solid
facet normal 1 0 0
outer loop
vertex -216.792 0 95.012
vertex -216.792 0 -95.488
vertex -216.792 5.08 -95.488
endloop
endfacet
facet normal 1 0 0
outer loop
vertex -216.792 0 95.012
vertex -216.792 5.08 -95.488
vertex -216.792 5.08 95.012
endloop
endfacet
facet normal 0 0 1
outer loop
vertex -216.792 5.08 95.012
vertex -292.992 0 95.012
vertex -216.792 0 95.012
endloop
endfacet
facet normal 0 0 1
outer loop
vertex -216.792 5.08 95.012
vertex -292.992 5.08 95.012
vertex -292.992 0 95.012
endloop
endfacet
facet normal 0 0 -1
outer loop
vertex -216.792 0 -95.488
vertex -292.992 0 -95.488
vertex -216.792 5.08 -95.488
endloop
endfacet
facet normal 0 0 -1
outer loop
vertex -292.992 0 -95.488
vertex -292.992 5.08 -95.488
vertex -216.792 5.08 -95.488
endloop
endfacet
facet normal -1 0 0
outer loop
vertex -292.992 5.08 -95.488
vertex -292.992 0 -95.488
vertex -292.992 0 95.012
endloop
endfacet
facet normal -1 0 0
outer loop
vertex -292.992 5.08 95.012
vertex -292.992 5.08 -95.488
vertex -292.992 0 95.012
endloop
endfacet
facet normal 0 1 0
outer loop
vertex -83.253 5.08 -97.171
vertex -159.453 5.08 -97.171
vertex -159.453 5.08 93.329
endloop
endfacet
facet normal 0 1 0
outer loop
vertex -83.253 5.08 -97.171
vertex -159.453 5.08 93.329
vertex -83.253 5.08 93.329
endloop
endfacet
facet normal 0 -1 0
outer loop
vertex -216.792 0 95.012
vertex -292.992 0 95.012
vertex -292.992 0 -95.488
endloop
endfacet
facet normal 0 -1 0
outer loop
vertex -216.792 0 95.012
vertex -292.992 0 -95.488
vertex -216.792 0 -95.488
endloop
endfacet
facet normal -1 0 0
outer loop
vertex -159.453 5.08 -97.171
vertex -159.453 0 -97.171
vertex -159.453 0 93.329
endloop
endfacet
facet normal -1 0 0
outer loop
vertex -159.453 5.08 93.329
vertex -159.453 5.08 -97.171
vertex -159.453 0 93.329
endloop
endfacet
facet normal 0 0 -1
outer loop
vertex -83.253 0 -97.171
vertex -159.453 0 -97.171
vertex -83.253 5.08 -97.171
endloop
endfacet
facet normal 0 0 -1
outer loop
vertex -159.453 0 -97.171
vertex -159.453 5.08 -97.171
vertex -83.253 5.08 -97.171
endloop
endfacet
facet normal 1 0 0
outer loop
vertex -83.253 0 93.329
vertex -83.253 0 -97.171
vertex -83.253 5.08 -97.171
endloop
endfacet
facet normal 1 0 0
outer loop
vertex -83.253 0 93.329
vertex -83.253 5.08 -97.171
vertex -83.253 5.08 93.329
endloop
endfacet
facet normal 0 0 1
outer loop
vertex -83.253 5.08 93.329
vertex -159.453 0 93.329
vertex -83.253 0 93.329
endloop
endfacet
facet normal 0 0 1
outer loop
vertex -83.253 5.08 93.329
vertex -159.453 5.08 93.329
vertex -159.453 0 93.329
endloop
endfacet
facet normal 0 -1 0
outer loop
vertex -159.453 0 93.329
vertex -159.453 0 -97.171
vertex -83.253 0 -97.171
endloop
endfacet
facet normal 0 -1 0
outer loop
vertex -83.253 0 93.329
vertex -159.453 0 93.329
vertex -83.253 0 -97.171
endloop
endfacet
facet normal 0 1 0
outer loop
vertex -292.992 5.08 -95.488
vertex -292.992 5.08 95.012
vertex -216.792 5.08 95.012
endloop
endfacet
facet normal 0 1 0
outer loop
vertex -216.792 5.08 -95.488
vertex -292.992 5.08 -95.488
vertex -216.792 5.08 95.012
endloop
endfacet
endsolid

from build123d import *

# Parameters (mm, degrees)
SKETCH1_W   = 76.2
SKETCH1_H   = 190.5
THICKEN1_T1 = 5.08
SKETCH2_W   = 76.2
SKETCH2_H   = 190.5
THICKEN2_T1 = 5.08


with BuildPart() as body_1:
    # Sketch1 → Surface-Plane1: a flat surface bounded by the sketch
    with BuildSketch(Plane(origin=(0, 0, 0), x_dir=(1, 0, 0), z_dir=(0, 1, 0)), mode=Mode.PRIVATE) as surface_plane1_1_region:
        with Locations((-121.35322314, 1.920743802)):
            Rectangle(SKETCH1_W, SKETCH1_H)
    surface_plane1_1 = surface_plane1_1_region.sketch.faces()[0]
    add(Solid.thicken(surface_plane1_1, THICKEN1_T1))


with BuildPart() as body_2:
    # Sketch2 → Surface-Plane2: a flat surface bounded by the sketch
    with BuildSketch(Plane(origin=(0, 0, 0), x_dir=(1, 0, 0), z_dir=(0, 1, 0)), mode=Mode.PRIVATE) as surface_plane2_2_region:
        with Locations((-254.891531356, 0.238317939)):
            Rectangle(SKETCH2_W, SKETCH2_H)
    surface_plane2_2 = surface_plane2_2_region.sketch.faces()[0]
    add(Solid.thicken(surface_plane2_2, THICKEN2_T1))


solid = Compound([body_1.part, body_2.part])
